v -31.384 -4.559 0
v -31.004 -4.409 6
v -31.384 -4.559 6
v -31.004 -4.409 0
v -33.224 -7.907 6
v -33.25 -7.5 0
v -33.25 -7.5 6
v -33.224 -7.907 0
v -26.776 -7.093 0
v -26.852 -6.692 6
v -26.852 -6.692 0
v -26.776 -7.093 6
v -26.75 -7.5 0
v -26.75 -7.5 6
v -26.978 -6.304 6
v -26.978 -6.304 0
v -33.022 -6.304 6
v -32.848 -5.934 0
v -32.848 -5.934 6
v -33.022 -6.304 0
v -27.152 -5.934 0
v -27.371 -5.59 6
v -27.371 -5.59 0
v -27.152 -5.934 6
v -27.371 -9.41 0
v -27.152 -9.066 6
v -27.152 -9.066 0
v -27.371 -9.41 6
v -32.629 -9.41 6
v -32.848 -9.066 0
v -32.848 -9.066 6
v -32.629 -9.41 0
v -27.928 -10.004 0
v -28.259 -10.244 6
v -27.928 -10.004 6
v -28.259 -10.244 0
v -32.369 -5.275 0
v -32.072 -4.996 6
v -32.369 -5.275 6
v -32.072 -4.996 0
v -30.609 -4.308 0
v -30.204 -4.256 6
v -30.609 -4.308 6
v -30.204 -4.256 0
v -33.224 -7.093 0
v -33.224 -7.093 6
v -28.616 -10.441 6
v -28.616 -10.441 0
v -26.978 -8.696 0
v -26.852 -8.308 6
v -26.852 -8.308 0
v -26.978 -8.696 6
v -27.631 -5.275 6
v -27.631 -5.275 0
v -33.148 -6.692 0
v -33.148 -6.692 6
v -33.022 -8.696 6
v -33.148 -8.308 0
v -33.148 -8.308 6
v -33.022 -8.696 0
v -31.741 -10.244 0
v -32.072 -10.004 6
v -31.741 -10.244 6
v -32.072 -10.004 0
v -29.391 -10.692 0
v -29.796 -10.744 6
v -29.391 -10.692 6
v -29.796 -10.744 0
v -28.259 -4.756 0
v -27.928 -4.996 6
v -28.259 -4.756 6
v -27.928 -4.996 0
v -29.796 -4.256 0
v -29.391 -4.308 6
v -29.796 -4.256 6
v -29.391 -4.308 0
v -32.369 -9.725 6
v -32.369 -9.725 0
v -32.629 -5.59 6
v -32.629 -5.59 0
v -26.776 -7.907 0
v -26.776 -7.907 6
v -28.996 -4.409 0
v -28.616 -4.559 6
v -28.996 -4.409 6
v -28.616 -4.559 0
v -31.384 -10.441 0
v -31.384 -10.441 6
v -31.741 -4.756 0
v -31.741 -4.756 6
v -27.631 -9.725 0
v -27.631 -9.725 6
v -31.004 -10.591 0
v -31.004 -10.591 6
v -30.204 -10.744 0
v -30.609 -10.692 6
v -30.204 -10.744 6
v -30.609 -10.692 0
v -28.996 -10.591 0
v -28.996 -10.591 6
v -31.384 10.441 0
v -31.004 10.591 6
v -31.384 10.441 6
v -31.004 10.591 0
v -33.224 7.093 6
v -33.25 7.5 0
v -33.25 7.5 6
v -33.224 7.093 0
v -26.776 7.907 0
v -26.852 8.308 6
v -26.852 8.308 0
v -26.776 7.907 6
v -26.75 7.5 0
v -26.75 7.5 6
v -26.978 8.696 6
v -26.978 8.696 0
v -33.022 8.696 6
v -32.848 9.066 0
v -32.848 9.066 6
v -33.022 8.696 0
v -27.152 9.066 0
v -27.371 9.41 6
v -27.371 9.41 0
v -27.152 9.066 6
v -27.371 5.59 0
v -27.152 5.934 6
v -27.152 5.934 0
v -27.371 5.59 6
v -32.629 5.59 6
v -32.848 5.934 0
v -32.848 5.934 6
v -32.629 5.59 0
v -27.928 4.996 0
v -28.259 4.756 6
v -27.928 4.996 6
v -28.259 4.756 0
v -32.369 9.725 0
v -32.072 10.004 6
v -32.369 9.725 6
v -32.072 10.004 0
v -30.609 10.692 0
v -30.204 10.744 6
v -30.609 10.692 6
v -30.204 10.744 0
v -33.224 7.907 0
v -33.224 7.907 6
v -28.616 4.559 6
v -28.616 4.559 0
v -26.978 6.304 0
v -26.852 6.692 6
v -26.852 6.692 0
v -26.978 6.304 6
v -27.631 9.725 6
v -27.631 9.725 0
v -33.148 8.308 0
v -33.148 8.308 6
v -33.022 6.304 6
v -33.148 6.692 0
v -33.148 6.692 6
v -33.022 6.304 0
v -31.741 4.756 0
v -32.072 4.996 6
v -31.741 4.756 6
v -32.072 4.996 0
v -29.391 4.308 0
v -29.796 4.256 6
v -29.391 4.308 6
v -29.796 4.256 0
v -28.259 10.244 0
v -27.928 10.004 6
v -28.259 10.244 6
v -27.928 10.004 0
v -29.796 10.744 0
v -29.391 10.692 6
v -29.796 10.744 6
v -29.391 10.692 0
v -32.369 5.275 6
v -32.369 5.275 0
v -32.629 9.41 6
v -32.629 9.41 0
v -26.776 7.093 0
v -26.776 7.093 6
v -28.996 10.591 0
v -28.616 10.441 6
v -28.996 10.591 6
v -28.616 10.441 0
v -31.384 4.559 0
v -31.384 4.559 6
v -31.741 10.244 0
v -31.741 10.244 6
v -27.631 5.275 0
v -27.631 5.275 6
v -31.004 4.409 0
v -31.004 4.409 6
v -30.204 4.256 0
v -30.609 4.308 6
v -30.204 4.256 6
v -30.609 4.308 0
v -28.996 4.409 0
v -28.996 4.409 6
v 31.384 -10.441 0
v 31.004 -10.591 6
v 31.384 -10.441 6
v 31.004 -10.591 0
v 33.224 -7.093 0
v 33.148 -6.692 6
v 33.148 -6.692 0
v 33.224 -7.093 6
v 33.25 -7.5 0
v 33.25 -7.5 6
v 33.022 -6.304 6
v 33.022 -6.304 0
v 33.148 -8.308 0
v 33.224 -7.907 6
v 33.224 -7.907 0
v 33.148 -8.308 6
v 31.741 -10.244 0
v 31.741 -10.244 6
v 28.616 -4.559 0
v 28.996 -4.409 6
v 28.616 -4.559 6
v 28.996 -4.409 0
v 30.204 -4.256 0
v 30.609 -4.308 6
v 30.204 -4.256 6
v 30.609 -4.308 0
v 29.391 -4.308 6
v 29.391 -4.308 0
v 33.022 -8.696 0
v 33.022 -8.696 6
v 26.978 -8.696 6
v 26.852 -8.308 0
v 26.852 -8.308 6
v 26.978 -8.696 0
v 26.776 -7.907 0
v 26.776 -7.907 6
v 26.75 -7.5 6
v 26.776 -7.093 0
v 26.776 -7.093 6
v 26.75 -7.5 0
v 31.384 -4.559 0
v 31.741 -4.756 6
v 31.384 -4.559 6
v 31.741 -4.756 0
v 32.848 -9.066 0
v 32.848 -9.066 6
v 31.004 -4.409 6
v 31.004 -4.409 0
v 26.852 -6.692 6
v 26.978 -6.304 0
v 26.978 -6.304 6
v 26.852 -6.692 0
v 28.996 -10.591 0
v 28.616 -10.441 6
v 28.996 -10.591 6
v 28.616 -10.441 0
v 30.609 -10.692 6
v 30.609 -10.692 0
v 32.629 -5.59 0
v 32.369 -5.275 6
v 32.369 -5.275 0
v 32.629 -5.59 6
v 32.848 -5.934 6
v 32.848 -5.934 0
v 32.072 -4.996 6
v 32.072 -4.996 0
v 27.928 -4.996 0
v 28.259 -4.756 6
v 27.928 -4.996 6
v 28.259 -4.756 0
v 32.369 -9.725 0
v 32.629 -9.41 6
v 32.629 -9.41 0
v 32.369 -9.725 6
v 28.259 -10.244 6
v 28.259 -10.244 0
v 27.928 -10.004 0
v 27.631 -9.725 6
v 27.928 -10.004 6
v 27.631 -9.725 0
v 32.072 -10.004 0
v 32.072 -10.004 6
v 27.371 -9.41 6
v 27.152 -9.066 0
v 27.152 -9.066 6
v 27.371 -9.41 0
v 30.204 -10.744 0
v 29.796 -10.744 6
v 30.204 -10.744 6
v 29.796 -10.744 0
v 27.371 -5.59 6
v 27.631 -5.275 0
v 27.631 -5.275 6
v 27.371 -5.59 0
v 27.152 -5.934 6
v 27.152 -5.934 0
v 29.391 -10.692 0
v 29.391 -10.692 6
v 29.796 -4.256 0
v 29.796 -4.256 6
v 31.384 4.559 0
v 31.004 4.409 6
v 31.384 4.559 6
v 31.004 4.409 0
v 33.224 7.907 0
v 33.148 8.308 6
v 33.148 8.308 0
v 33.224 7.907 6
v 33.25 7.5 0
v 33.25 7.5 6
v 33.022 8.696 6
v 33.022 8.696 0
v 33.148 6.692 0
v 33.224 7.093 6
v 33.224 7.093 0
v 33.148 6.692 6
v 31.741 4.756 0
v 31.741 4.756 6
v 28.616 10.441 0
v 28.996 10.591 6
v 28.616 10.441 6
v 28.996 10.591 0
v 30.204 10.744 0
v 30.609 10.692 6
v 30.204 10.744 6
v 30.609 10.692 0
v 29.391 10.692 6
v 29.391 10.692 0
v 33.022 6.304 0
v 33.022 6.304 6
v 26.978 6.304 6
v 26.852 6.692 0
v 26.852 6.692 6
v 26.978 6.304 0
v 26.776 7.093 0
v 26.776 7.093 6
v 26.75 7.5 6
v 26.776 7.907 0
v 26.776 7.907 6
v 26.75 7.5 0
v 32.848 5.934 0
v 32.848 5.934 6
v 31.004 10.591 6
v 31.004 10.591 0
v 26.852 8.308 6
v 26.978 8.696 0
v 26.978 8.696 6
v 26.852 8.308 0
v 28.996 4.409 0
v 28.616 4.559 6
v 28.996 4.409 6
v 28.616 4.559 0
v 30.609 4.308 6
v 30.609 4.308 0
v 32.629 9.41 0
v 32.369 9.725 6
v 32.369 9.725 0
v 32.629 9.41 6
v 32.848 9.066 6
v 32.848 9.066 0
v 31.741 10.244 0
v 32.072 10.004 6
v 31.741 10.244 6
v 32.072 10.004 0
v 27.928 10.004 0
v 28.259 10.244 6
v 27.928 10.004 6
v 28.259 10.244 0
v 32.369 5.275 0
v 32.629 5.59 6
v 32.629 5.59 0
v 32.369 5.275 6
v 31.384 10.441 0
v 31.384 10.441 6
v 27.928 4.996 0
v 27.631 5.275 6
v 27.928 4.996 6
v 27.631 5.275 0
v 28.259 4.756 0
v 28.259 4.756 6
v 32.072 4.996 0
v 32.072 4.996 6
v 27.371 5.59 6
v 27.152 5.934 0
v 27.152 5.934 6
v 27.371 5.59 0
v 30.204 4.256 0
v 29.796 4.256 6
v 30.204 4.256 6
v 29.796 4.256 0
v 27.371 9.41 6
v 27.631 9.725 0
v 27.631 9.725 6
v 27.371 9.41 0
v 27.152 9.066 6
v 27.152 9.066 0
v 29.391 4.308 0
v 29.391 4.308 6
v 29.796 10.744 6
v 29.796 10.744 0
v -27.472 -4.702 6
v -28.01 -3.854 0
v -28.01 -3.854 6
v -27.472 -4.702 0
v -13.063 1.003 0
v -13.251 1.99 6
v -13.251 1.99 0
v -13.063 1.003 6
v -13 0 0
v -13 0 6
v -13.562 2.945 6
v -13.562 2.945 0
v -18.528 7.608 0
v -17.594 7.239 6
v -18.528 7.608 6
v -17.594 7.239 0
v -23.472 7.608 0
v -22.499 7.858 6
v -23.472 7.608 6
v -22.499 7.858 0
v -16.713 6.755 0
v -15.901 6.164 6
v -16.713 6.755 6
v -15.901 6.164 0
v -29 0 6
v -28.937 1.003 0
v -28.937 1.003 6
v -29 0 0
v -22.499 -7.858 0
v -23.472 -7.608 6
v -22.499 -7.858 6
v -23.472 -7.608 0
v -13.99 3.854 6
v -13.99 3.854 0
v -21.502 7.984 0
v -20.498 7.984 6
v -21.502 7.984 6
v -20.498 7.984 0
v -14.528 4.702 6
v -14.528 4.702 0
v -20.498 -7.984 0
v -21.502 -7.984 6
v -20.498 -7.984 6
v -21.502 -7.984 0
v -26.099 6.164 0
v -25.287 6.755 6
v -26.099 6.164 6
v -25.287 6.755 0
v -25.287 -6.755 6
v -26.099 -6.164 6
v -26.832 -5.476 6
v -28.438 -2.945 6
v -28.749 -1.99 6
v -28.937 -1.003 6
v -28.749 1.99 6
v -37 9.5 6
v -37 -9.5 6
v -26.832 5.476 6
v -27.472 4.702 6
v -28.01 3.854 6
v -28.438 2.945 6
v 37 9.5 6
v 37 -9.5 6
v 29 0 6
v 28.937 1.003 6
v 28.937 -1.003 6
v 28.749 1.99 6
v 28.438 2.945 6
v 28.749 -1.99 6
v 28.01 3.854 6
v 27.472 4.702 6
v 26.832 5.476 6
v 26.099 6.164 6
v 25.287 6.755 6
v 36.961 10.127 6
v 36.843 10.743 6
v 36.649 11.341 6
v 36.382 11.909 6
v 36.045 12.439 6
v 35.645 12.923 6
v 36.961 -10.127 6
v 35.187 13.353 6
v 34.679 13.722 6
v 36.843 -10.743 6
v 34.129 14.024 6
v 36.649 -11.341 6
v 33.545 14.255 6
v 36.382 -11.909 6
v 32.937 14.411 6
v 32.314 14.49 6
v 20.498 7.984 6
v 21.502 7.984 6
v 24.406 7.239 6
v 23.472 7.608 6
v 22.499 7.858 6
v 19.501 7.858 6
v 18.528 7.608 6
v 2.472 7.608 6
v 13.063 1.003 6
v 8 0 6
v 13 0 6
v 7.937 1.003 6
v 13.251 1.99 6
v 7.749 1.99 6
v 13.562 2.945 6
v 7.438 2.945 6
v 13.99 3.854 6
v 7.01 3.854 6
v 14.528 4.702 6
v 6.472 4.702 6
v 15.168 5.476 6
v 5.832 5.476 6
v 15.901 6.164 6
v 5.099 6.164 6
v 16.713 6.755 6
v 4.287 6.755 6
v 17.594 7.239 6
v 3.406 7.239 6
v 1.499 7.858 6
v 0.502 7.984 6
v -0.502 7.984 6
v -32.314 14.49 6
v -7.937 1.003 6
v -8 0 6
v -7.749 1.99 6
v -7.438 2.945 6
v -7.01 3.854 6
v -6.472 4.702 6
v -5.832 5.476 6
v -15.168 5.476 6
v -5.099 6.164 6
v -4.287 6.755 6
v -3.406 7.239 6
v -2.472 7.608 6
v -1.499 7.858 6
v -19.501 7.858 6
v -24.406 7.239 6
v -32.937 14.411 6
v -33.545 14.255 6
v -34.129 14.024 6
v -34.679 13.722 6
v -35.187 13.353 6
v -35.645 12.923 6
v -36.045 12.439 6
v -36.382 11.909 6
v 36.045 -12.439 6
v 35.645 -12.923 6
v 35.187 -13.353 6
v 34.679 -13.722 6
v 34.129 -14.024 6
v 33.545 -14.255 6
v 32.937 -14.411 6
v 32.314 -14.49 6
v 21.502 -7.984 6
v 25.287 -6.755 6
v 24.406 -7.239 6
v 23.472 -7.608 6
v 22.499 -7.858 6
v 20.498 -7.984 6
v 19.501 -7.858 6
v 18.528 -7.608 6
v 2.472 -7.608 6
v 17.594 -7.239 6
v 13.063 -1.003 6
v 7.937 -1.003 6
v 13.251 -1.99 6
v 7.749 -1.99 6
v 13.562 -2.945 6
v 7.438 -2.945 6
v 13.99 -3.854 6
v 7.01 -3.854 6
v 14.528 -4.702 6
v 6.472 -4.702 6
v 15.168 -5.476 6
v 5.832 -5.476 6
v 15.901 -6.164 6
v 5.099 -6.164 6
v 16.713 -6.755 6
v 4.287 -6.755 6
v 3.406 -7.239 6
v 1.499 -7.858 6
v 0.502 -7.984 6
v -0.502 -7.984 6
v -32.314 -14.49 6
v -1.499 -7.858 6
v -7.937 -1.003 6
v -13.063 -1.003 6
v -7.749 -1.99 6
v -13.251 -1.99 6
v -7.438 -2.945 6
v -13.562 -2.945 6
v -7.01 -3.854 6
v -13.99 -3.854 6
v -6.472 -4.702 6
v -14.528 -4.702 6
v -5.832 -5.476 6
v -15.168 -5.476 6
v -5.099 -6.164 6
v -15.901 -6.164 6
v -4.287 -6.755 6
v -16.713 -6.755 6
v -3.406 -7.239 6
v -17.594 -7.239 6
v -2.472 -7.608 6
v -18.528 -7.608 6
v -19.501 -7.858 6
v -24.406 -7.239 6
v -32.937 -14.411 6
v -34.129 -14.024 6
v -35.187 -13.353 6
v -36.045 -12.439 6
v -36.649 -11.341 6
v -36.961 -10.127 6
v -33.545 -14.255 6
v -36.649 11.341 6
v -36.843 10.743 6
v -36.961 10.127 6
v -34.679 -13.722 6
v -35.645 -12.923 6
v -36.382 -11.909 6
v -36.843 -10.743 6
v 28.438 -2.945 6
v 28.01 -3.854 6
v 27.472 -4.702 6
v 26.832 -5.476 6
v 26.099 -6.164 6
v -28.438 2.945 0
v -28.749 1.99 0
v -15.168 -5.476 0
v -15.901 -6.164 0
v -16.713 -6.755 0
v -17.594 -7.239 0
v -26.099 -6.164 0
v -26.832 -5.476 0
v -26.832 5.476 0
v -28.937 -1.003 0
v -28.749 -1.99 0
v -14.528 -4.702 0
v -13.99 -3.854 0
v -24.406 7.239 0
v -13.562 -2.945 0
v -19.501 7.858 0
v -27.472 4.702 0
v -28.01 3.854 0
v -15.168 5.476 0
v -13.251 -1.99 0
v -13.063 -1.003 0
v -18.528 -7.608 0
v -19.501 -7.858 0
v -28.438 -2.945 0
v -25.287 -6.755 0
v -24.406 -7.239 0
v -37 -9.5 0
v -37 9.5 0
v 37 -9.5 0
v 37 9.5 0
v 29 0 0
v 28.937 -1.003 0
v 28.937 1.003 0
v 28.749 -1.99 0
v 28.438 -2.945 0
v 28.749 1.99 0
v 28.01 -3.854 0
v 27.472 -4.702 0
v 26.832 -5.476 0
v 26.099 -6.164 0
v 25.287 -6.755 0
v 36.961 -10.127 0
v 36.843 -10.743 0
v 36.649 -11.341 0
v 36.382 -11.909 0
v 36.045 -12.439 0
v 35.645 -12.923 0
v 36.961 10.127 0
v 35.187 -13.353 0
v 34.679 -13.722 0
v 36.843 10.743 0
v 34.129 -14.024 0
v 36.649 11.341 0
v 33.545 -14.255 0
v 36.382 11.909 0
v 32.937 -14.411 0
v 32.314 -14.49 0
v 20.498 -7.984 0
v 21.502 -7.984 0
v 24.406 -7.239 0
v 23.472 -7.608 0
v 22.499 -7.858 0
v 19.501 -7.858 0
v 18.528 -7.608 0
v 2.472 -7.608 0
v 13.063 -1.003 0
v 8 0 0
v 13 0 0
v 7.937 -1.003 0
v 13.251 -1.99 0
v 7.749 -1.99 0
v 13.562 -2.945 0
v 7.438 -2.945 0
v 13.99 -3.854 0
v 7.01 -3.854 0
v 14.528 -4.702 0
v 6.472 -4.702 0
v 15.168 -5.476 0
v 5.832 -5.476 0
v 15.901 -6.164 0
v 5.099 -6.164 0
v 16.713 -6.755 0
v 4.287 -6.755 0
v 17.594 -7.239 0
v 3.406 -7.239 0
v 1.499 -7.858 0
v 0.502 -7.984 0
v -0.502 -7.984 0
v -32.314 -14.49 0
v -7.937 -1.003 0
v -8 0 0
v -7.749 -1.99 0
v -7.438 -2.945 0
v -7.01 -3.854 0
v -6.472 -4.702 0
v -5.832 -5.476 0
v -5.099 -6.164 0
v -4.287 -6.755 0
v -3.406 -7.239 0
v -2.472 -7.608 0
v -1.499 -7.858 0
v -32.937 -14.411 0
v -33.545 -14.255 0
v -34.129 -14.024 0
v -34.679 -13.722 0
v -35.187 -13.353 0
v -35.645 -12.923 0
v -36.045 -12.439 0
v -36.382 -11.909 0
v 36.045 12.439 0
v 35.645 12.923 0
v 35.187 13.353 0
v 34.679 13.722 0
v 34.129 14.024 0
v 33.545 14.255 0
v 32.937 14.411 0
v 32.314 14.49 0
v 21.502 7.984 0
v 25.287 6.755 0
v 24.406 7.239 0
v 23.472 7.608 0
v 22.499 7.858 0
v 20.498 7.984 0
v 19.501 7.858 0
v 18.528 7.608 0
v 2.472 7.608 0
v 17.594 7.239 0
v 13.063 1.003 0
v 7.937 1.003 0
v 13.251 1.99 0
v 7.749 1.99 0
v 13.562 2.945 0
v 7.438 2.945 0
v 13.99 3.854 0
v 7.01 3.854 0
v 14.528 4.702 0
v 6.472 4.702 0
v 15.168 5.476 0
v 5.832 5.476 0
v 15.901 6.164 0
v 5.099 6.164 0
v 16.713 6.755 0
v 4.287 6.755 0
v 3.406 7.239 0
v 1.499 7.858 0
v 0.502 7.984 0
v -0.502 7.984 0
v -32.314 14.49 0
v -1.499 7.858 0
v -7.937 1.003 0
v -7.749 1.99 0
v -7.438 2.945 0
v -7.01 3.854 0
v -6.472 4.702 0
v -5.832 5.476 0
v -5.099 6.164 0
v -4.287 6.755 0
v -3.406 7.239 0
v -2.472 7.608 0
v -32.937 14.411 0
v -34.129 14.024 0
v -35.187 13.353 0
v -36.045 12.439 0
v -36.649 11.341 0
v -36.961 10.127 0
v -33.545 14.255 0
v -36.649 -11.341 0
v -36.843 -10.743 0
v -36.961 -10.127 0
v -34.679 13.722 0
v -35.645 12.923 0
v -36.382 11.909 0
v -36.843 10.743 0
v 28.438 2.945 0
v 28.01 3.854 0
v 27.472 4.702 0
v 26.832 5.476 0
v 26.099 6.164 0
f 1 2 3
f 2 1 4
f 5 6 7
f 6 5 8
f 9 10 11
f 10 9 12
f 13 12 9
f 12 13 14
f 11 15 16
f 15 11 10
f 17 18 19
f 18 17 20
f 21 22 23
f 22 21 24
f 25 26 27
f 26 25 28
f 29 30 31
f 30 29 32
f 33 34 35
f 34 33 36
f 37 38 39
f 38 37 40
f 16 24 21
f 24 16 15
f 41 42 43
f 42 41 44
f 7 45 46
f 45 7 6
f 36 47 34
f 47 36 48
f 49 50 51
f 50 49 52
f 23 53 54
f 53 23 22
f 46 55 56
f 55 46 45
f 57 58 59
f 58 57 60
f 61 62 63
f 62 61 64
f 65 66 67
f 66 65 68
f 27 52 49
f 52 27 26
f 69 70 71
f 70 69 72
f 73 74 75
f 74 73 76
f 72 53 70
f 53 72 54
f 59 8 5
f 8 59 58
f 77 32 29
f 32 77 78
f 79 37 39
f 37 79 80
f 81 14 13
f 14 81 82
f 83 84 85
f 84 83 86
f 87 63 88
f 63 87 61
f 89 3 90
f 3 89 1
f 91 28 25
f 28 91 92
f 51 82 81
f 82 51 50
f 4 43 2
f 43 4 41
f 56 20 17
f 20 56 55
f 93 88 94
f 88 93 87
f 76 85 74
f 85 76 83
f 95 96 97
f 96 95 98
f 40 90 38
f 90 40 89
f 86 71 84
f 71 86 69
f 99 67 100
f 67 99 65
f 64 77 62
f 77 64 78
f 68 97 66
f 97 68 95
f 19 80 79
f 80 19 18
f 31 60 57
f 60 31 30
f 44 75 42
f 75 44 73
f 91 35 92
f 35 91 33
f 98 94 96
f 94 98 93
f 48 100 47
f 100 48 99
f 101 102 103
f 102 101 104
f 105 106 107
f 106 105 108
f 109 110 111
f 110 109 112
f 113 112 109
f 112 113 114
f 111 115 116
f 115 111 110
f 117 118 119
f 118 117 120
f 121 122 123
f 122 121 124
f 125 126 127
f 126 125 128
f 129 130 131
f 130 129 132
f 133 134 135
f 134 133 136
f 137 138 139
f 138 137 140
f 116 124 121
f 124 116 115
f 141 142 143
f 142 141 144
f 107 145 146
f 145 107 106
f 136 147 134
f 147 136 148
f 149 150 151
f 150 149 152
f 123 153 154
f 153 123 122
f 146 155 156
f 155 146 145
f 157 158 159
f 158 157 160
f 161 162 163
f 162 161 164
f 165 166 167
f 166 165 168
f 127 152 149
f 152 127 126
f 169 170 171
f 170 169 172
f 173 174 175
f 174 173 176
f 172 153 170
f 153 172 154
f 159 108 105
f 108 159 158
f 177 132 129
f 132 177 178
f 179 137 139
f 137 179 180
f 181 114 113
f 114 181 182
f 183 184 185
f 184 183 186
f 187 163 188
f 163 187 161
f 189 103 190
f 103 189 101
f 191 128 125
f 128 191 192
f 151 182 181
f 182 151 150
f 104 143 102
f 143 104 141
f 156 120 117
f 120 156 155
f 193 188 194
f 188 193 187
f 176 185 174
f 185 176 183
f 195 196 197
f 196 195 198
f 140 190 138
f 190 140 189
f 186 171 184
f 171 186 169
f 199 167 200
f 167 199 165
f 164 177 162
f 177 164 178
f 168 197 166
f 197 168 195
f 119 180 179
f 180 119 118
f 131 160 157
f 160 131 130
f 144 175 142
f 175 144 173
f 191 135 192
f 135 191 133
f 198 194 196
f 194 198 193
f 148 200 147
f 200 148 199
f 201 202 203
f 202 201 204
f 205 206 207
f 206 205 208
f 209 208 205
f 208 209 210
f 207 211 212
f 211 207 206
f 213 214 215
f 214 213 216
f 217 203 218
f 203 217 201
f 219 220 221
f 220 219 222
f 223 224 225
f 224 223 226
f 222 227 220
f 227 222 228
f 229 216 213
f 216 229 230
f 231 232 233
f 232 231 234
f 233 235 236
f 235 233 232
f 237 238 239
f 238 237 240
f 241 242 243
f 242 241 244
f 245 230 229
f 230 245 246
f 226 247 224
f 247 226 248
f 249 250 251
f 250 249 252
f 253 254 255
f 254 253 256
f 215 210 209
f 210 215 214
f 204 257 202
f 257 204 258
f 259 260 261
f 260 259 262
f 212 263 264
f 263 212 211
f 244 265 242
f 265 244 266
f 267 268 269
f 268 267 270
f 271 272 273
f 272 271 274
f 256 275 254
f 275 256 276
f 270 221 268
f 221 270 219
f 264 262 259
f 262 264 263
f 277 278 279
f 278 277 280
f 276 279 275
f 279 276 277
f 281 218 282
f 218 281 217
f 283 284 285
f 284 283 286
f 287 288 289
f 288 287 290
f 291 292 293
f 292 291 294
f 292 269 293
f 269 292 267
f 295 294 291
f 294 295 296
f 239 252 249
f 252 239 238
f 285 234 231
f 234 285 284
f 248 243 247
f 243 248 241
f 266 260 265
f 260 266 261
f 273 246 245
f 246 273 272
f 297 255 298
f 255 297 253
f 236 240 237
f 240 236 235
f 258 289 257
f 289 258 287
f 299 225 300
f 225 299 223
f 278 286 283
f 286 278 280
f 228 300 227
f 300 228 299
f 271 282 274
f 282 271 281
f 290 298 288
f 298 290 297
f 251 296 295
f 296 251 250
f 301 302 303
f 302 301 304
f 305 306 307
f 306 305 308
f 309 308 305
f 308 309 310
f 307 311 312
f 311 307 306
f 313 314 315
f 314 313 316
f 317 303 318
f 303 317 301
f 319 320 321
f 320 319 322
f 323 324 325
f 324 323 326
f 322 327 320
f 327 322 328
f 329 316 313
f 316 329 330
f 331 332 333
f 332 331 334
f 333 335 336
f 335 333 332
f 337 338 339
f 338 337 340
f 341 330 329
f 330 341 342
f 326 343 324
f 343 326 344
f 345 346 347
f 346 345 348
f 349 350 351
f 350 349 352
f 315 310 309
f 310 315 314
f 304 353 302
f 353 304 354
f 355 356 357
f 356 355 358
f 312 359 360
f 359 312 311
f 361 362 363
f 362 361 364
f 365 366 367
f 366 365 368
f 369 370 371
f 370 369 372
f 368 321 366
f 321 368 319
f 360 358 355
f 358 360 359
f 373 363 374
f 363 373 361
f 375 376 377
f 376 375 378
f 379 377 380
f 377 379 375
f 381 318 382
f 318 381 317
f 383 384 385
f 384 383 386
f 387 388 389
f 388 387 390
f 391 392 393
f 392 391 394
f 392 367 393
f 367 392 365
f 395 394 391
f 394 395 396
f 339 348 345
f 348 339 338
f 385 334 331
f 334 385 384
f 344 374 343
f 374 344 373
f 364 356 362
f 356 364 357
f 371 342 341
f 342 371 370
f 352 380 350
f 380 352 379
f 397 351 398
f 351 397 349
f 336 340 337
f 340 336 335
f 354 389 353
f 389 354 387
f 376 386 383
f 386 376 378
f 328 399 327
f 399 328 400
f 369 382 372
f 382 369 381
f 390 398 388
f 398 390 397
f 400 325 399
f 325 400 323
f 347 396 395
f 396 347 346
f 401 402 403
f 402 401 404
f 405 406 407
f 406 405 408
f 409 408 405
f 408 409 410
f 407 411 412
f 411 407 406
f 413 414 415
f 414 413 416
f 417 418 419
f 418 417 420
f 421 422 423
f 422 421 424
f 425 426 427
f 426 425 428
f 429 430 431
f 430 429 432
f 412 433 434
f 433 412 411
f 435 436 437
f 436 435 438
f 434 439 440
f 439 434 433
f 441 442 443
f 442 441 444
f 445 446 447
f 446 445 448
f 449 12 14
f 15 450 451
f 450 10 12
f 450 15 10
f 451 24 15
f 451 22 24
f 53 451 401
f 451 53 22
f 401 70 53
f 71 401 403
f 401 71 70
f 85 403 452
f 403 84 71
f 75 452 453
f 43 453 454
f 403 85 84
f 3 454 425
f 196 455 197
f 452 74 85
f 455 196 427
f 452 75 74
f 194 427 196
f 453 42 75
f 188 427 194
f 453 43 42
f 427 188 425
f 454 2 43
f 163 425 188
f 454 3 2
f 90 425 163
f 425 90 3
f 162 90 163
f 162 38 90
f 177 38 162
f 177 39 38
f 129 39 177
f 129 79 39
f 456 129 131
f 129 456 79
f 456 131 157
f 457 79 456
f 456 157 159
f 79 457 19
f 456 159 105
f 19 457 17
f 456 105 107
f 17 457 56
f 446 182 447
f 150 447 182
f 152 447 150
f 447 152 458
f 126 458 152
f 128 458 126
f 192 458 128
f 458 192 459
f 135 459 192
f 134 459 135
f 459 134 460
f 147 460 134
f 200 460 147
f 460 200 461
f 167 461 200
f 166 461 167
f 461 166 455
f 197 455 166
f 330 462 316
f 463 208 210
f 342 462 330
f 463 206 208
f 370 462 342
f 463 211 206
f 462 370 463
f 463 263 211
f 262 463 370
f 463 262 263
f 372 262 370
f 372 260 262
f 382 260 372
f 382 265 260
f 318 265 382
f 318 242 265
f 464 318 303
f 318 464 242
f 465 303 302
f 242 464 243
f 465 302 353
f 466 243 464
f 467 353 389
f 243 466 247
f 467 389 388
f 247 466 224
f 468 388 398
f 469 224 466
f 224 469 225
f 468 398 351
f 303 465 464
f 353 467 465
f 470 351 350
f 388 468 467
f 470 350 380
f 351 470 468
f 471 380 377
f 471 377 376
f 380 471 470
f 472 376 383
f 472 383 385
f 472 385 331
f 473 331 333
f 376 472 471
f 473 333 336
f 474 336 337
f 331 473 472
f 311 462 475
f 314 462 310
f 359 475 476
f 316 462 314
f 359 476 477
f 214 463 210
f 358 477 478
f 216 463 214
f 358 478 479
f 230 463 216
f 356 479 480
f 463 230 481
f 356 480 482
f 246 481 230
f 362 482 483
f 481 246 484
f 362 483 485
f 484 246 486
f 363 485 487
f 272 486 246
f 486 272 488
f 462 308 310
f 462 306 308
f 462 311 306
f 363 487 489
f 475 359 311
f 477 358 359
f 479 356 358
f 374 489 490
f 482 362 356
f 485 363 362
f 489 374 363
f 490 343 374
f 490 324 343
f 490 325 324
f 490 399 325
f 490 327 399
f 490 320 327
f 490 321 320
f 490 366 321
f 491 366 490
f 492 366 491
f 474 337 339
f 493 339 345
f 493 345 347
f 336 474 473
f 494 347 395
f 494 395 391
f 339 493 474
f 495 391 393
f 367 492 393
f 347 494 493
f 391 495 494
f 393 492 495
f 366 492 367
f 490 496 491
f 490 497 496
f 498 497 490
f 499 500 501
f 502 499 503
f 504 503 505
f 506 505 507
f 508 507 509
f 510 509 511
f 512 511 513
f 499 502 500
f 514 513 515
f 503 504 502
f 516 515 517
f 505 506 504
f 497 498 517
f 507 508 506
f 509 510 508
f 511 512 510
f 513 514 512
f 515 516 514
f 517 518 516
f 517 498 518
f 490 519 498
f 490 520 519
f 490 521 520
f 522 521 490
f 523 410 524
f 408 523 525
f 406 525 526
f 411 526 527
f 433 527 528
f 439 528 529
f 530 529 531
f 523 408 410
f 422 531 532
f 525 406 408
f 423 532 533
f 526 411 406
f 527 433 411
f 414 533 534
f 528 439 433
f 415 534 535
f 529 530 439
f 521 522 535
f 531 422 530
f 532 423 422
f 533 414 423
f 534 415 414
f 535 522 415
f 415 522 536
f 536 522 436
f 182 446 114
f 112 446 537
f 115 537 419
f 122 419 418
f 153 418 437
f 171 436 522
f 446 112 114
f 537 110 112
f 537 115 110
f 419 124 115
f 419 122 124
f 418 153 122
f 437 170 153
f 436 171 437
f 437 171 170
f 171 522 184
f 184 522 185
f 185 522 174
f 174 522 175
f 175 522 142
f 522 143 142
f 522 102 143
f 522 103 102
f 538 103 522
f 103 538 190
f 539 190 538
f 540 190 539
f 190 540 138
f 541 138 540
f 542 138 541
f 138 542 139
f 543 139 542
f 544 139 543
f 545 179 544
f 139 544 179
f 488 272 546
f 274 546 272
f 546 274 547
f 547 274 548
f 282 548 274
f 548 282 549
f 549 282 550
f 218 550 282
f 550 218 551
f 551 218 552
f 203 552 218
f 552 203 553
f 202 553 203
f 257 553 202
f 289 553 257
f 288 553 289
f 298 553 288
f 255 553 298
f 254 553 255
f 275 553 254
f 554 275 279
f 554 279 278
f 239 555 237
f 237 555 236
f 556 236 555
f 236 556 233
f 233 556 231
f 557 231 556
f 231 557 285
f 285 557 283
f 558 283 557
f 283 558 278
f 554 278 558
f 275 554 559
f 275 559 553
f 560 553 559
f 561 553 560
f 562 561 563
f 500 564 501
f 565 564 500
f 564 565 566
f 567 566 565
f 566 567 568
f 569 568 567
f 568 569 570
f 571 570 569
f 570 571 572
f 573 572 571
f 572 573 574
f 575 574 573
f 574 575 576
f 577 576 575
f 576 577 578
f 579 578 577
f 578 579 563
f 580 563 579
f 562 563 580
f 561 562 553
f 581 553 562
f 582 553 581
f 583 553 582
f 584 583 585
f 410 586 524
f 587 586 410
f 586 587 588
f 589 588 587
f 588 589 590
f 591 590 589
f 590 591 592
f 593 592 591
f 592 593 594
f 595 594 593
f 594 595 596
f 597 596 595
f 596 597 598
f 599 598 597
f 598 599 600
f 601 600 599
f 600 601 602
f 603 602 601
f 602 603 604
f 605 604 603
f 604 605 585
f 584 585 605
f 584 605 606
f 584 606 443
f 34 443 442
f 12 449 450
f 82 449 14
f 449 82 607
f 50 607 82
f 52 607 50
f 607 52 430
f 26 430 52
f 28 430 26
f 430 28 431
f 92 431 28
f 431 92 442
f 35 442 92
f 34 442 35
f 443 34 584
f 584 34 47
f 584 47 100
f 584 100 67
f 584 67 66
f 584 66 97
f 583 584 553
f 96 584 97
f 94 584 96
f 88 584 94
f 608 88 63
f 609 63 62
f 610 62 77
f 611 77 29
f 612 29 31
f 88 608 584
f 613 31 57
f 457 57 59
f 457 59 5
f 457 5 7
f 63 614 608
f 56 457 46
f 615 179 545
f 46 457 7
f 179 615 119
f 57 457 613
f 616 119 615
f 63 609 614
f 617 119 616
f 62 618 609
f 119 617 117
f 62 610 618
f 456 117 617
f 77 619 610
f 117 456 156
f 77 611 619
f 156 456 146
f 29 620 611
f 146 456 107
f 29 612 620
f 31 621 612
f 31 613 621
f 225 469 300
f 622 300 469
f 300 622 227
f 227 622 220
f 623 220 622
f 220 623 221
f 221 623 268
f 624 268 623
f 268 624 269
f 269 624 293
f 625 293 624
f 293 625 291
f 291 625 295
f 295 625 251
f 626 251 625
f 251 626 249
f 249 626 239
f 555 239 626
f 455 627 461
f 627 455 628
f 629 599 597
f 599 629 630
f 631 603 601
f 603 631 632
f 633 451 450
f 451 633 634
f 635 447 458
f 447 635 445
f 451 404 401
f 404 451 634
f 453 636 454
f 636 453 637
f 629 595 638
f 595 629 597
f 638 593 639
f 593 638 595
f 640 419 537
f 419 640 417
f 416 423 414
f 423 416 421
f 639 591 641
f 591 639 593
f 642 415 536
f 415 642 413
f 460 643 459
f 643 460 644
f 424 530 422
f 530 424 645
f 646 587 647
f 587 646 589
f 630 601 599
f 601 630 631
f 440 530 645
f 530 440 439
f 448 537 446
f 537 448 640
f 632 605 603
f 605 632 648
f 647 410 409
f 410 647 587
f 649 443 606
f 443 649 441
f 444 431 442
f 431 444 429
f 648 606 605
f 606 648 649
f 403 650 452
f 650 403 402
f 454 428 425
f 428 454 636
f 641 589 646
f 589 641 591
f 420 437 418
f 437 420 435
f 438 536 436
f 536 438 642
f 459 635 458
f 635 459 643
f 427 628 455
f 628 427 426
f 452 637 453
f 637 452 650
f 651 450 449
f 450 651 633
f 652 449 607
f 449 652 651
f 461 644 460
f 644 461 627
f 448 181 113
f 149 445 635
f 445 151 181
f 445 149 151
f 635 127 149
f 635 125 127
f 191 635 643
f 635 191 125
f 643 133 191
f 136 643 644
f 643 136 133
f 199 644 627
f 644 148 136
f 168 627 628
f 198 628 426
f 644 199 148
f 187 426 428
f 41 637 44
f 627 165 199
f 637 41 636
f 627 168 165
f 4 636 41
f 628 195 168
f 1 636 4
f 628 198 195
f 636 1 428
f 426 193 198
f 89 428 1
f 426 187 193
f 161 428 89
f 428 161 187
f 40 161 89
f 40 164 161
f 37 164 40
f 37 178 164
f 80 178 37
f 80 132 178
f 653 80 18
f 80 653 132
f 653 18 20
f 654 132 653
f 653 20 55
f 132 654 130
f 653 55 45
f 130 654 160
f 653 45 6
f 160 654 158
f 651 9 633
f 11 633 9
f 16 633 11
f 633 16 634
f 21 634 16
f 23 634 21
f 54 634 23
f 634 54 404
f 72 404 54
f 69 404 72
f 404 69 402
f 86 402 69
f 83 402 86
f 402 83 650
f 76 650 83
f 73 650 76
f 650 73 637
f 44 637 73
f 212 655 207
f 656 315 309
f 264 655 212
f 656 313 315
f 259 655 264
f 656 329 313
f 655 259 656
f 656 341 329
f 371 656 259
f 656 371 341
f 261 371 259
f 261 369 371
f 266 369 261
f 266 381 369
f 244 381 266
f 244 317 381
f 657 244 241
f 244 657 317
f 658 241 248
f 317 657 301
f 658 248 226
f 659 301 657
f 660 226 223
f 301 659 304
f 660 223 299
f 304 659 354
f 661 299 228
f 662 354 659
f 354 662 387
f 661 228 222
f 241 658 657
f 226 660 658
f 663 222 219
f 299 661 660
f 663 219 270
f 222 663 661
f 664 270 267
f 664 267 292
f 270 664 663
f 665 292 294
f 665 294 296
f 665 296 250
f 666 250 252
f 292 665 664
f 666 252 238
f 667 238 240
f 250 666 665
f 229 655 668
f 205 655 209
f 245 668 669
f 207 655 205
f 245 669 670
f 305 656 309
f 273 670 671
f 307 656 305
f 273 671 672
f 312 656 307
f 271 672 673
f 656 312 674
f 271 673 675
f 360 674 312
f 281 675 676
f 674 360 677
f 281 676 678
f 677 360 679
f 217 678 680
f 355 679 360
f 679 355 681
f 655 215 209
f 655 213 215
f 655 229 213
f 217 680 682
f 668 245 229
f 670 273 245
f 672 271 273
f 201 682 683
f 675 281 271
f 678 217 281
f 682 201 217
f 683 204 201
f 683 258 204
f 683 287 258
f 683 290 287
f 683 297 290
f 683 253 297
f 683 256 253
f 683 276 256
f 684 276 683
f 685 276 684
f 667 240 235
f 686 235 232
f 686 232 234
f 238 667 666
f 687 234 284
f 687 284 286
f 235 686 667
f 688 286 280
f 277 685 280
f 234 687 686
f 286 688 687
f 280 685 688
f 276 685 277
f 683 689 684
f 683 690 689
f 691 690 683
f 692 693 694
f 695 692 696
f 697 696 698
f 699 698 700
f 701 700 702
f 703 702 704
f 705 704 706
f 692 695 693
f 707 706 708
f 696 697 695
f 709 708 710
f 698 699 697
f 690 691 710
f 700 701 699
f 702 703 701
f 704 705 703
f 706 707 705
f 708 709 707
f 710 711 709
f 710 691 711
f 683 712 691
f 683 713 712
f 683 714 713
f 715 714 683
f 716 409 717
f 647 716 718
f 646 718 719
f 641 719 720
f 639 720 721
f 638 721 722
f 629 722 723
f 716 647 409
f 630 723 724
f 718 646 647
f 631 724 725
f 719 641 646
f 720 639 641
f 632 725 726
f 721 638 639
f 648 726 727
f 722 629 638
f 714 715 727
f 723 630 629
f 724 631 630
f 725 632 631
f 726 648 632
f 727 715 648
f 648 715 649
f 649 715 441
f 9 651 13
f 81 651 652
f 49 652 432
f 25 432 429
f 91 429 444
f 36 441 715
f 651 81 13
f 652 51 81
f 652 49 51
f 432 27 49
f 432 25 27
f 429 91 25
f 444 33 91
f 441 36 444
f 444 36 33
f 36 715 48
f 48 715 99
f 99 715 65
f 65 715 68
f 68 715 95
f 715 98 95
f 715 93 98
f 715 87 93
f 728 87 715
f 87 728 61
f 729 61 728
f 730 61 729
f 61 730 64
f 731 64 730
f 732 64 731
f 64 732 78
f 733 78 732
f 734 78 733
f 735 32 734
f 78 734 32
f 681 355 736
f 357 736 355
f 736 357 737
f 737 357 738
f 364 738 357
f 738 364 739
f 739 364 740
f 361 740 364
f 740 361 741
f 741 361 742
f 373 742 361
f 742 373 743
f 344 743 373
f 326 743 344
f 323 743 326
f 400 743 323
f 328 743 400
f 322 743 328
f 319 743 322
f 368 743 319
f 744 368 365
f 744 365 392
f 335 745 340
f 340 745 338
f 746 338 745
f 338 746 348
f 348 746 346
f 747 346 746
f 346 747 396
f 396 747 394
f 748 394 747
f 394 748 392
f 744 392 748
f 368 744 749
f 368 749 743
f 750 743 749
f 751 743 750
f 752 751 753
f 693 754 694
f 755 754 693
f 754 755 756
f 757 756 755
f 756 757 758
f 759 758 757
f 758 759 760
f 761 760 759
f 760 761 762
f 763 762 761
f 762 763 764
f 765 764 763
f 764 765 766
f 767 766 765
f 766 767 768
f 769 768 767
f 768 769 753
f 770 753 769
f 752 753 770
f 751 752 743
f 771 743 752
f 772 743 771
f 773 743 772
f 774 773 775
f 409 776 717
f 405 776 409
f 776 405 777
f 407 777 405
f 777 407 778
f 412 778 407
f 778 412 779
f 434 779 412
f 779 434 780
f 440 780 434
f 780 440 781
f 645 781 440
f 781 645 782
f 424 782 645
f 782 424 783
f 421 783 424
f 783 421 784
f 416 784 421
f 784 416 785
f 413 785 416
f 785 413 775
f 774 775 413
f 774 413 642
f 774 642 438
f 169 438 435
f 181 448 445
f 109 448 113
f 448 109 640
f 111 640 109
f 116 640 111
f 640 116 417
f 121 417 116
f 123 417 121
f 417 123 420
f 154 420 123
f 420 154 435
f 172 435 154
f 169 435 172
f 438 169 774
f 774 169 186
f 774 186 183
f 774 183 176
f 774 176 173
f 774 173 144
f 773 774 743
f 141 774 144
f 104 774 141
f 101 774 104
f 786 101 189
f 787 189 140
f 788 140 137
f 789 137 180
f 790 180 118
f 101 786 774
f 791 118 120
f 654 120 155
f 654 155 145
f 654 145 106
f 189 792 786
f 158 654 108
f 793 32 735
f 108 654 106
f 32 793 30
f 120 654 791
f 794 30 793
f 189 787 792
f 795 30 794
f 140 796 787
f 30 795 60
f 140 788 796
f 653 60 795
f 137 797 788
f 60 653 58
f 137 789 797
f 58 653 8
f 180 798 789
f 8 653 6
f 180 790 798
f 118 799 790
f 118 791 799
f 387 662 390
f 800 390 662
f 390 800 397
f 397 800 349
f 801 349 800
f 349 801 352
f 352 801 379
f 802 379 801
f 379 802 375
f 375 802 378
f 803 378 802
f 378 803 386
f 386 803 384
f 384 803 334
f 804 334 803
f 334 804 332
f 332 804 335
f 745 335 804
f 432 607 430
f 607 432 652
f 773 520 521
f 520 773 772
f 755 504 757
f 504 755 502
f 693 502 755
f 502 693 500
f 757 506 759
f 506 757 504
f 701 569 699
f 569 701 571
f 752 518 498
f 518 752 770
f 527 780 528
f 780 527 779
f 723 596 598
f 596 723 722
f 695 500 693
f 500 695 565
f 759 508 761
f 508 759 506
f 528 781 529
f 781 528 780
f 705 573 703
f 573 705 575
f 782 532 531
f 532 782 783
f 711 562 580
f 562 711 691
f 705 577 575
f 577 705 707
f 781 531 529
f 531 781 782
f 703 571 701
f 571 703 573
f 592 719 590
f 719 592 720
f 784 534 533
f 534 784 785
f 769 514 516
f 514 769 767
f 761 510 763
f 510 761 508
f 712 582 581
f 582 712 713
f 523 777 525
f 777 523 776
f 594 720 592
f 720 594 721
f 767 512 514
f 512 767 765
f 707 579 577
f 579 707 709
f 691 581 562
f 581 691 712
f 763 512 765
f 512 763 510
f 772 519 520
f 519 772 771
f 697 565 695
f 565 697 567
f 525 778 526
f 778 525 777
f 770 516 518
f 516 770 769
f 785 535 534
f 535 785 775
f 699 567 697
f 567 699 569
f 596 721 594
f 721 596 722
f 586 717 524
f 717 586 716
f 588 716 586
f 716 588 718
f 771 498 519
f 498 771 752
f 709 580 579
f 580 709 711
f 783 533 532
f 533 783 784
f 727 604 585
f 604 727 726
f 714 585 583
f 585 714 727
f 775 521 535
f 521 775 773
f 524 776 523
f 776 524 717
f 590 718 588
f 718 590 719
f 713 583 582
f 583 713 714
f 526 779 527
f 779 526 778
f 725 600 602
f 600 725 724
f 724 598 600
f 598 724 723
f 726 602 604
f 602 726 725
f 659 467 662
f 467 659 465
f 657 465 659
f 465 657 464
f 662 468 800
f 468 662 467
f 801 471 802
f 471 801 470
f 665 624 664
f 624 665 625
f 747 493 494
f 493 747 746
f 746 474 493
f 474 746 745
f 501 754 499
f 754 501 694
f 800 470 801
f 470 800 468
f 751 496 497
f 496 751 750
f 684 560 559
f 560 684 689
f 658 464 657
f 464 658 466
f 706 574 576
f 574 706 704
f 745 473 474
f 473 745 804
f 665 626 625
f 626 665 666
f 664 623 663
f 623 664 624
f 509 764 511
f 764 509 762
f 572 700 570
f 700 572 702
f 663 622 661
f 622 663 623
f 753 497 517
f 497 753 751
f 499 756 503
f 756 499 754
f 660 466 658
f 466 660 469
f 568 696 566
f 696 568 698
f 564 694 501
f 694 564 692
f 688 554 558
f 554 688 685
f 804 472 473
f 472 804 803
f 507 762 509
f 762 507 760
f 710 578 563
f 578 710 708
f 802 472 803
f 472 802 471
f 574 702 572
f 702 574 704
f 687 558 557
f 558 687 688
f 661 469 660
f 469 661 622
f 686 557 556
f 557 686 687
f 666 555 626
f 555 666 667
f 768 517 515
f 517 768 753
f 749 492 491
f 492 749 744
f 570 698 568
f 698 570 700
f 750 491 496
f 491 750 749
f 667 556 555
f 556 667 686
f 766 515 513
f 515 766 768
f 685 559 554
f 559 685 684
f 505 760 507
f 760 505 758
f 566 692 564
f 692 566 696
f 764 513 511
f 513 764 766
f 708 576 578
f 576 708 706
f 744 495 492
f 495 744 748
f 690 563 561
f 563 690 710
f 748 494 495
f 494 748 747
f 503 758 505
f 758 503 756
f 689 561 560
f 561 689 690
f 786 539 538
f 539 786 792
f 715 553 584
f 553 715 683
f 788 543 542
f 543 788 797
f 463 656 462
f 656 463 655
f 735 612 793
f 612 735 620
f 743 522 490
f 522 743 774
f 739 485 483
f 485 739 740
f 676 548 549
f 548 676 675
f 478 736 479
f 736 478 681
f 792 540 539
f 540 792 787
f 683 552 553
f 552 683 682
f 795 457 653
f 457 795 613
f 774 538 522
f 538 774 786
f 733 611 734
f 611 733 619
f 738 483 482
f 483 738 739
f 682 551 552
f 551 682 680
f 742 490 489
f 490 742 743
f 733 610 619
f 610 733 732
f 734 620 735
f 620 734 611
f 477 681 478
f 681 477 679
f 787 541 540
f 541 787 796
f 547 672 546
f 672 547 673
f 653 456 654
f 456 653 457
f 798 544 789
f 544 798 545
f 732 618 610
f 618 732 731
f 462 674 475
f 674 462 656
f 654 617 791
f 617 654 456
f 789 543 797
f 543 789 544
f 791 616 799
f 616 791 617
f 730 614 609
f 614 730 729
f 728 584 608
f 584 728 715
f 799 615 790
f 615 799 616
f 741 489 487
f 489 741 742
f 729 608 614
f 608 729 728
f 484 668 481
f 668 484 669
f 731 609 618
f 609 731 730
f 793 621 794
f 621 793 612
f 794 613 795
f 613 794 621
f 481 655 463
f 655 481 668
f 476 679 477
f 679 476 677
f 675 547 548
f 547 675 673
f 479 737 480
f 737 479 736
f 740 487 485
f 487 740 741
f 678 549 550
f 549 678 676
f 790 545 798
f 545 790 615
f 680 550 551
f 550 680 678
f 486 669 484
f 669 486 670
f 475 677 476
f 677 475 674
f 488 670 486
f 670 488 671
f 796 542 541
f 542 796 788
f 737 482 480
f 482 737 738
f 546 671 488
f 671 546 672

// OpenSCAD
$fn = 50;


difference() {
	union() {
		hull() {
			translate(v = [-32.0000000000, 9.5000000000, 0]) {
				cylinder(h = 6, r = 5);
			}
			translate(v = [32.0000000000, 9.5000000000, 0]) {
				cylinder(h = 6, r = 5);
			}
			translate(v = [-32.0000000000, -9.5000000000, 0]) {
				cylinder(h = 6, r = 5);
			}
			translate(v = [32.0000000000, -9.5000000000, 0]) {
				cylinder(h = 6, r = 5);
			}
		}
	}
	union() {
		#translate(v = [-30.0000000000, -7.5000000000, -100.0000000000]) {
			cylinder(h = 200, r = 3.2500000000);
		}
		#translate(v = [-30.0000000000, 7.5000000000, -100.0000000000]) {
			cylinder(h = 200, r = 3.2500000000);
		}
		#translate(v = [30.0000000000, -7.5000000000, -100.0000000000]) {
			cylinder(h = 200, r = 3.2500000000);
		}
		#translate(v = [30.0000000000, 7.5000000000, -100.0000000000]) {
			cylinder(h = 200, r = 3.2500000000);
		}
		#translate(v = [-21.0000000000, 0, 0]) {
			cylinder(h = 6, r = 8.0000000000);
		}
		#cylinder(h = 6, r = 8.0000000000);
		#translate(v = [21.0000000000, 0, 0]) {
			cylinder(h = 6, r = 8.0000000000);
		}
	}
}
